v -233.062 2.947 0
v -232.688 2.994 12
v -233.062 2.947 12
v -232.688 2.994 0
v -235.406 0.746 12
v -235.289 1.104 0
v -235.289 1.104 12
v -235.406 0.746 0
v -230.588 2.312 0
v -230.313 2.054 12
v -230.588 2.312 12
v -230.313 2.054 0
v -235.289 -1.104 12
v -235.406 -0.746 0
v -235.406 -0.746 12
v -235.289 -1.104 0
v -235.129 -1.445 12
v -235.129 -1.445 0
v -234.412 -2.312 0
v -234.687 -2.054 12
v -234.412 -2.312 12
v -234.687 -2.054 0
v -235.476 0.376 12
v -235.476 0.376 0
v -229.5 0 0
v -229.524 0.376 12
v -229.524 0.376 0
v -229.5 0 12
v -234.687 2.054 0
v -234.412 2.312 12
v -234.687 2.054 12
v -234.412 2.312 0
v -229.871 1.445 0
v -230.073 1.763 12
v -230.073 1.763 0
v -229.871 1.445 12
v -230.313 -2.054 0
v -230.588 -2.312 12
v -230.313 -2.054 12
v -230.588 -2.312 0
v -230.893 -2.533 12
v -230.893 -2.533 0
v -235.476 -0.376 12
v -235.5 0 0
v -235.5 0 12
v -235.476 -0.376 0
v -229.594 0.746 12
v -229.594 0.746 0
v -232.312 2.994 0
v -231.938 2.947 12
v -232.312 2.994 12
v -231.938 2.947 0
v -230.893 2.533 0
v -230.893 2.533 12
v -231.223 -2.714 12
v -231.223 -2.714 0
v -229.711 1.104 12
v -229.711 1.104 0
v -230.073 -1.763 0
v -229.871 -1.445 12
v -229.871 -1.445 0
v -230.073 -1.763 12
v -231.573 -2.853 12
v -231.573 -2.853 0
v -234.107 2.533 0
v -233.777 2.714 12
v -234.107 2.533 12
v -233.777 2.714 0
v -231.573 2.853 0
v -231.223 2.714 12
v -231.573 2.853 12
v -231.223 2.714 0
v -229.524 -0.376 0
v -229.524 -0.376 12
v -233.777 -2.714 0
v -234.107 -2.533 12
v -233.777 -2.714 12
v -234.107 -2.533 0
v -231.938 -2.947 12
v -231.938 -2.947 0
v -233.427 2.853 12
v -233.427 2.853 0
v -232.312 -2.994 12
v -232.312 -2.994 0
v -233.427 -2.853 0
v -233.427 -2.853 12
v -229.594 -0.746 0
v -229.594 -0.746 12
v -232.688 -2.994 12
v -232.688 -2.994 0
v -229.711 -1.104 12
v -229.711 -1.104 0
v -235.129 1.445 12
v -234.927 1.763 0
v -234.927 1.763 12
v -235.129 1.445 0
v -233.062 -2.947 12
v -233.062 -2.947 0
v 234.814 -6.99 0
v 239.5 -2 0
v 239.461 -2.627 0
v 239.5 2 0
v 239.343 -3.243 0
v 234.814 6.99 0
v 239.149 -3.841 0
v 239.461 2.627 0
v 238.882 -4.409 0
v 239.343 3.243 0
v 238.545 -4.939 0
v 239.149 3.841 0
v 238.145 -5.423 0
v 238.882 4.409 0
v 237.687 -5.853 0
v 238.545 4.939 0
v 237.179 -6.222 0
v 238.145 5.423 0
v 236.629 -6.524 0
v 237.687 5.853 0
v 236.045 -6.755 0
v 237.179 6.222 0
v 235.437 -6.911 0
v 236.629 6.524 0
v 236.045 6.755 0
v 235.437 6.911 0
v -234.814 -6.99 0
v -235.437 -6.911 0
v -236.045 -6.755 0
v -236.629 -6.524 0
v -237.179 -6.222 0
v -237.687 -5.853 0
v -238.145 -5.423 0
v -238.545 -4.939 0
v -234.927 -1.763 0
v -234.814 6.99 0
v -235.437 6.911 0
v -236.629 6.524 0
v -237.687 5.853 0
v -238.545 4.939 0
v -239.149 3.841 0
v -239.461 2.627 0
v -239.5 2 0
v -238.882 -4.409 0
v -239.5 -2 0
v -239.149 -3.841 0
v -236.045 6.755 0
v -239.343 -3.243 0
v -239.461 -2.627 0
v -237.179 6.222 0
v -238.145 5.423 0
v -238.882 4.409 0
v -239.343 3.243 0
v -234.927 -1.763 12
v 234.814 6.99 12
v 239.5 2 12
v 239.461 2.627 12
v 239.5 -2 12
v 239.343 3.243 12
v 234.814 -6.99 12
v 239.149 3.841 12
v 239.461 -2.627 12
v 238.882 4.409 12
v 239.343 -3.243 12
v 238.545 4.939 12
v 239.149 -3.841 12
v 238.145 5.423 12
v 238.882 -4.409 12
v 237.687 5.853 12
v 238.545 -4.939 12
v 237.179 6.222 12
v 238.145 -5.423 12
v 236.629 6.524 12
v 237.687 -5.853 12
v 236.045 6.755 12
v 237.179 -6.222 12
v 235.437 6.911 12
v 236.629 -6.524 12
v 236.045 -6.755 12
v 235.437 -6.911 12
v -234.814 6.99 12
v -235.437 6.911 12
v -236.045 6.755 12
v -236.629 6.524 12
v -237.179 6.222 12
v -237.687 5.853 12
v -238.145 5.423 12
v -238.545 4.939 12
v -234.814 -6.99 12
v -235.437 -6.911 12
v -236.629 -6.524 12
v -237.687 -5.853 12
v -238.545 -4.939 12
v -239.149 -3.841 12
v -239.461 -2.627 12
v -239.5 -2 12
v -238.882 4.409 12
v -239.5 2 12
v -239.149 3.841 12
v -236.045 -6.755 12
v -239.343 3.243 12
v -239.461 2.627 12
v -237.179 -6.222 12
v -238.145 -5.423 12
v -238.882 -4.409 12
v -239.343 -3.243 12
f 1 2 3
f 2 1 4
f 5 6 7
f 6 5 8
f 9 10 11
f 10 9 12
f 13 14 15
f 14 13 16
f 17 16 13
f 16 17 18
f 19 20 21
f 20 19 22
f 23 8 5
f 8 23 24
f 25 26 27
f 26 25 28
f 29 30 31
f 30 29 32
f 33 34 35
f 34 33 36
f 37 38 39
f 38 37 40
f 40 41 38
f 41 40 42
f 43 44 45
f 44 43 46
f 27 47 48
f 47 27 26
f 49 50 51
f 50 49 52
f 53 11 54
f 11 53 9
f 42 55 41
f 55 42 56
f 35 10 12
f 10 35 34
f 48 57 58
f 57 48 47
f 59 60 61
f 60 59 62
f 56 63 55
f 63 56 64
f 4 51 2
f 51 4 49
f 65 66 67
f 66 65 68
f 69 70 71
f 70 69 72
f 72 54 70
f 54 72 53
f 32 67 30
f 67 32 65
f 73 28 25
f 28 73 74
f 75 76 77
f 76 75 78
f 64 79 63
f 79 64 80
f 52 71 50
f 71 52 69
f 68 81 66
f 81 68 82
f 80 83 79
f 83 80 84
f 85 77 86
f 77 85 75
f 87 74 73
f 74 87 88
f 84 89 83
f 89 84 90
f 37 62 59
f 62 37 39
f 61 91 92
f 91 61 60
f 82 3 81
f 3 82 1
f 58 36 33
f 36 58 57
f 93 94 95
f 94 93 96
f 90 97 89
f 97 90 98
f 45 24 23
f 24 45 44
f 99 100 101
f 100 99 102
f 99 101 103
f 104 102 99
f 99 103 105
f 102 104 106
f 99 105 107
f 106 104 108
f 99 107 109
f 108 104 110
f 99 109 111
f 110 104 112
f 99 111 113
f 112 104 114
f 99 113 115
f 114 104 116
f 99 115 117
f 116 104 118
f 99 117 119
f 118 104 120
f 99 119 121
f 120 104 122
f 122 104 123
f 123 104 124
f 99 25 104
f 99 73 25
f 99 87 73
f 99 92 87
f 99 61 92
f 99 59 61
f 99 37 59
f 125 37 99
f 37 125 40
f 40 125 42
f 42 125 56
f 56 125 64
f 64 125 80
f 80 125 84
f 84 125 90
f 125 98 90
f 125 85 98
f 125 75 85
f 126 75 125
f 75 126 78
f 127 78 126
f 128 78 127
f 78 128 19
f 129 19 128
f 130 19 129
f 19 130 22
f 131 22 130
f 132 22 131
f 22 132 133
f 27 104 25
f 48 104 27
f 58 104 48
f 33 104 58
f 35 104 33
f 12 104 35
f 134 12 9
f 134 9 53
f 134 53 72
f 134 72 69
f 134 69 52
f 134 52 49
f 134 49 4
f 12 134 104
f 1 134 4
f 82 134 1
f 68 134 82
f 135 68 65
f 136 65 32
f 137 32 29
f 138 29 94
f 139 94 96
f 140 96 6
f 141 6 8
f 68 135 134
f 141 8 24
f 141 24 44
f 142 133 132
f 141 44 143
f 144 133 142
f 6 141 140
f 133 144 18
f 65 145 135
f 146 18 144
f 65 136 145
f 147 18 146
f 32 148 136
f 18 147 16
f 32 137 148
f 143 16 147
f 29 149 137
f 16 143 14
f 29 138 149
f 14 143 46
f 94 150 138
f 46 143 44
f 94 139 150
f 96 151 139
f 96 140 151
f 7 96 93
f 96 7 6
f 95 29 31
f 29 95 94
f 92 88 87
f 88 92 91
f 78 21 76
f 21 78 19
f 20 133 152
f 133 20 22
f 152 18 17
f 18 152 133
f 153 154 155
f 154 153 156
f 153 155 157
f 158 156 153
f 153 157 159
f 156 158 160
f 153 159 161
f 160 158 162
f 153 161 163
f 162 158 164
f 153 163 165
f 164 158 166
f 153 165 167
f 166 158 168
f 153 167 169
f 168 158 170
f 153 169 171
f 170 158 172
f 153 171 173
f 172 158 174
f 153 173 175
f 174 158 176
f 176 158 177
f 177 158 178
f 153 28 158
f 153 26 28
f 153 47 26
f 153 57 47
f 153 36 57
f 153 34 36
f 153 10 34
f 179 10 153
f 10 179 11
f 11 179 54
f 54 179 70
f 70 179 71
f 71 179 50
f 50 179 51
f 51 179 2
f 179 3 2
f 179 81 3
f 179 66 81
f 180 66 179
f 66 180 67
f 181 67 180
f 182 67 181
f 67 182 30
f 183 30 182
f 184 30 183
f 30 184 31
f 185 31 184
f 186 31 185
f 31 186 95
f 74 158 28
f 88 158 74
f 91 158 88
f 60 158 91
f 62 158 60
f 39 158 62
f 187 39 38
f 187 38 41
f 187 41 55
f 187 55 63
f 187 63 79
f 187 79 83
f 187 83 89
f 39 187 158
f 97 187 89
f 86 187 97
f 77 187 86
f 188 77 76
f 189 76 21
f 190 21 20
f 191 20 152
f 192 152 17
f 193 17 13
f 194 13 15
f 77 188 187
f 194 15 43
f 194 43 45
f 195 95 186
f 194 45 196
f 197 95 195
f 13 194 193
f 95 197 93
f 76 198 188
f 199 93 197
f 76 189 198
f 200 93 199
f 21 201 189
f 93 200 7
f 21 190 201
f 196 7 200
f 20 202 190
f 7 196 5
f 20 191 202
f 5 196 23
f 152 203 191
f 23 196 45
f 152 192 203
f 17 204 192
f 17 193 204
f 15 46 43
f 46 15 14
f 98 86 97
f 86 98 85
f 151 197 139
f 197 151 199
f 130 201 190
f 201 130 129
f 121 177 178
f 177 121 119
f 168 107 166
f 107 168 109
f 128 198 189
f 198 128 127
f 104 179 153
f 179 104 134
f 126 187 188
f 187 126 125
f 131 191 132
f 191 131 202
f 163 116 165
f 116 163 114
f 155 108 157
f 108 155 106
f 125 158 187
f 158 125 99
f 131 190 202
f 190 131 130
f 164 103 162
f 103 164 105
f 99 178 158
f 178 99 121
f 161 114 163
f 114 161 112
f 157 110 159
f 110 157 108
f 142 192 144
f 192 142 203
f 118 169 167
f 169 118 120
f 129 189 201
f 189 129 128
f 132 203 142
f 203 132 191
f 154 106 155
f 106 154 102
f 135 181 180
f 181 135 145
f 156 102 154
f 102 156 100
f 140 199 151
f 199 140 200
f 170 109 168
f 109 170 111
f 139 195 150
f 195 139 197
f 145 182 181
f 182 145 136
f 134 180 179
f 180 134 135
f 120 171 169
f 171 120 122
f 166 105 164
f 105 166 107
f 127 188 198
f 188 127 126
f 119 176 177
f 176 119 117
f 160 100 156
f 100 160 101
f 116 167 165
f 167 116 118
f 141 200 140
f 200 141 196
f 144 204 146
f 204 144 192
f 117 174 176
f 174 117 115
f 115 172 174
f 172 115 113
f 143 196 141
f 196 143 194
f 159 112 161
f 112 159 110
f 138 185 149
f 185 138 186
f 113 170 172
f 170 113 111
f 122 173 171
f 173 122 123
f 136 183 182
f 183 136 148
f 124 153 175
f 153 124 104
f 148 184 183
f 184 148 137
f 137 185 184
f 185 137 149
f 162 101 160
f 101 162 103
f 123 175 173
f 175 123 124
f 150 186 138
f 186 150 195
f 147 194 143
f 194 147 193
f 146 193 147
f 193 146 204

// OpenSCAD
$fn = 50;


difference() {
	union() {
		hull() {
			translate(v = [-234.5000000000, 2.0000000000, 0]) {
				cylinder(h = 12, r = 5);
			}
			translate(v = [234.5000000000, 2.0000000000, 0]) {
				cylinder(h = 12, r = 5);
			}
			translate(v = [-234.5000000000, -2.0000000000, 0]) {
				cylinder(h = 12, r = 5);
			}
			translate(v = [234.5000000000, -2.0000000000, 0]) {
				cylinder(h = 12, r = 5);
			}
		}
	}
	union() {
		translate(v = [-232.5000000000, 0.0000000000, 0]) {
			cylinder(h = 12, r = 3.0000000000);
		}
		translate(v = [-232.5000000000, 0.0000000000, 0]) {
			cylinder(h = 12, r = 1.5000000000);
		}
		translate(v = [-232.5000000000, 0.0000000000, 0]) {
			cylinder(h = 12, r = 1.5000000000);
		}
		translate(v = [-232.5000000000, 0.0000000000, 0]) {
			cylinder(h = 12, r = 1.5000000000);
		}
	}
}
